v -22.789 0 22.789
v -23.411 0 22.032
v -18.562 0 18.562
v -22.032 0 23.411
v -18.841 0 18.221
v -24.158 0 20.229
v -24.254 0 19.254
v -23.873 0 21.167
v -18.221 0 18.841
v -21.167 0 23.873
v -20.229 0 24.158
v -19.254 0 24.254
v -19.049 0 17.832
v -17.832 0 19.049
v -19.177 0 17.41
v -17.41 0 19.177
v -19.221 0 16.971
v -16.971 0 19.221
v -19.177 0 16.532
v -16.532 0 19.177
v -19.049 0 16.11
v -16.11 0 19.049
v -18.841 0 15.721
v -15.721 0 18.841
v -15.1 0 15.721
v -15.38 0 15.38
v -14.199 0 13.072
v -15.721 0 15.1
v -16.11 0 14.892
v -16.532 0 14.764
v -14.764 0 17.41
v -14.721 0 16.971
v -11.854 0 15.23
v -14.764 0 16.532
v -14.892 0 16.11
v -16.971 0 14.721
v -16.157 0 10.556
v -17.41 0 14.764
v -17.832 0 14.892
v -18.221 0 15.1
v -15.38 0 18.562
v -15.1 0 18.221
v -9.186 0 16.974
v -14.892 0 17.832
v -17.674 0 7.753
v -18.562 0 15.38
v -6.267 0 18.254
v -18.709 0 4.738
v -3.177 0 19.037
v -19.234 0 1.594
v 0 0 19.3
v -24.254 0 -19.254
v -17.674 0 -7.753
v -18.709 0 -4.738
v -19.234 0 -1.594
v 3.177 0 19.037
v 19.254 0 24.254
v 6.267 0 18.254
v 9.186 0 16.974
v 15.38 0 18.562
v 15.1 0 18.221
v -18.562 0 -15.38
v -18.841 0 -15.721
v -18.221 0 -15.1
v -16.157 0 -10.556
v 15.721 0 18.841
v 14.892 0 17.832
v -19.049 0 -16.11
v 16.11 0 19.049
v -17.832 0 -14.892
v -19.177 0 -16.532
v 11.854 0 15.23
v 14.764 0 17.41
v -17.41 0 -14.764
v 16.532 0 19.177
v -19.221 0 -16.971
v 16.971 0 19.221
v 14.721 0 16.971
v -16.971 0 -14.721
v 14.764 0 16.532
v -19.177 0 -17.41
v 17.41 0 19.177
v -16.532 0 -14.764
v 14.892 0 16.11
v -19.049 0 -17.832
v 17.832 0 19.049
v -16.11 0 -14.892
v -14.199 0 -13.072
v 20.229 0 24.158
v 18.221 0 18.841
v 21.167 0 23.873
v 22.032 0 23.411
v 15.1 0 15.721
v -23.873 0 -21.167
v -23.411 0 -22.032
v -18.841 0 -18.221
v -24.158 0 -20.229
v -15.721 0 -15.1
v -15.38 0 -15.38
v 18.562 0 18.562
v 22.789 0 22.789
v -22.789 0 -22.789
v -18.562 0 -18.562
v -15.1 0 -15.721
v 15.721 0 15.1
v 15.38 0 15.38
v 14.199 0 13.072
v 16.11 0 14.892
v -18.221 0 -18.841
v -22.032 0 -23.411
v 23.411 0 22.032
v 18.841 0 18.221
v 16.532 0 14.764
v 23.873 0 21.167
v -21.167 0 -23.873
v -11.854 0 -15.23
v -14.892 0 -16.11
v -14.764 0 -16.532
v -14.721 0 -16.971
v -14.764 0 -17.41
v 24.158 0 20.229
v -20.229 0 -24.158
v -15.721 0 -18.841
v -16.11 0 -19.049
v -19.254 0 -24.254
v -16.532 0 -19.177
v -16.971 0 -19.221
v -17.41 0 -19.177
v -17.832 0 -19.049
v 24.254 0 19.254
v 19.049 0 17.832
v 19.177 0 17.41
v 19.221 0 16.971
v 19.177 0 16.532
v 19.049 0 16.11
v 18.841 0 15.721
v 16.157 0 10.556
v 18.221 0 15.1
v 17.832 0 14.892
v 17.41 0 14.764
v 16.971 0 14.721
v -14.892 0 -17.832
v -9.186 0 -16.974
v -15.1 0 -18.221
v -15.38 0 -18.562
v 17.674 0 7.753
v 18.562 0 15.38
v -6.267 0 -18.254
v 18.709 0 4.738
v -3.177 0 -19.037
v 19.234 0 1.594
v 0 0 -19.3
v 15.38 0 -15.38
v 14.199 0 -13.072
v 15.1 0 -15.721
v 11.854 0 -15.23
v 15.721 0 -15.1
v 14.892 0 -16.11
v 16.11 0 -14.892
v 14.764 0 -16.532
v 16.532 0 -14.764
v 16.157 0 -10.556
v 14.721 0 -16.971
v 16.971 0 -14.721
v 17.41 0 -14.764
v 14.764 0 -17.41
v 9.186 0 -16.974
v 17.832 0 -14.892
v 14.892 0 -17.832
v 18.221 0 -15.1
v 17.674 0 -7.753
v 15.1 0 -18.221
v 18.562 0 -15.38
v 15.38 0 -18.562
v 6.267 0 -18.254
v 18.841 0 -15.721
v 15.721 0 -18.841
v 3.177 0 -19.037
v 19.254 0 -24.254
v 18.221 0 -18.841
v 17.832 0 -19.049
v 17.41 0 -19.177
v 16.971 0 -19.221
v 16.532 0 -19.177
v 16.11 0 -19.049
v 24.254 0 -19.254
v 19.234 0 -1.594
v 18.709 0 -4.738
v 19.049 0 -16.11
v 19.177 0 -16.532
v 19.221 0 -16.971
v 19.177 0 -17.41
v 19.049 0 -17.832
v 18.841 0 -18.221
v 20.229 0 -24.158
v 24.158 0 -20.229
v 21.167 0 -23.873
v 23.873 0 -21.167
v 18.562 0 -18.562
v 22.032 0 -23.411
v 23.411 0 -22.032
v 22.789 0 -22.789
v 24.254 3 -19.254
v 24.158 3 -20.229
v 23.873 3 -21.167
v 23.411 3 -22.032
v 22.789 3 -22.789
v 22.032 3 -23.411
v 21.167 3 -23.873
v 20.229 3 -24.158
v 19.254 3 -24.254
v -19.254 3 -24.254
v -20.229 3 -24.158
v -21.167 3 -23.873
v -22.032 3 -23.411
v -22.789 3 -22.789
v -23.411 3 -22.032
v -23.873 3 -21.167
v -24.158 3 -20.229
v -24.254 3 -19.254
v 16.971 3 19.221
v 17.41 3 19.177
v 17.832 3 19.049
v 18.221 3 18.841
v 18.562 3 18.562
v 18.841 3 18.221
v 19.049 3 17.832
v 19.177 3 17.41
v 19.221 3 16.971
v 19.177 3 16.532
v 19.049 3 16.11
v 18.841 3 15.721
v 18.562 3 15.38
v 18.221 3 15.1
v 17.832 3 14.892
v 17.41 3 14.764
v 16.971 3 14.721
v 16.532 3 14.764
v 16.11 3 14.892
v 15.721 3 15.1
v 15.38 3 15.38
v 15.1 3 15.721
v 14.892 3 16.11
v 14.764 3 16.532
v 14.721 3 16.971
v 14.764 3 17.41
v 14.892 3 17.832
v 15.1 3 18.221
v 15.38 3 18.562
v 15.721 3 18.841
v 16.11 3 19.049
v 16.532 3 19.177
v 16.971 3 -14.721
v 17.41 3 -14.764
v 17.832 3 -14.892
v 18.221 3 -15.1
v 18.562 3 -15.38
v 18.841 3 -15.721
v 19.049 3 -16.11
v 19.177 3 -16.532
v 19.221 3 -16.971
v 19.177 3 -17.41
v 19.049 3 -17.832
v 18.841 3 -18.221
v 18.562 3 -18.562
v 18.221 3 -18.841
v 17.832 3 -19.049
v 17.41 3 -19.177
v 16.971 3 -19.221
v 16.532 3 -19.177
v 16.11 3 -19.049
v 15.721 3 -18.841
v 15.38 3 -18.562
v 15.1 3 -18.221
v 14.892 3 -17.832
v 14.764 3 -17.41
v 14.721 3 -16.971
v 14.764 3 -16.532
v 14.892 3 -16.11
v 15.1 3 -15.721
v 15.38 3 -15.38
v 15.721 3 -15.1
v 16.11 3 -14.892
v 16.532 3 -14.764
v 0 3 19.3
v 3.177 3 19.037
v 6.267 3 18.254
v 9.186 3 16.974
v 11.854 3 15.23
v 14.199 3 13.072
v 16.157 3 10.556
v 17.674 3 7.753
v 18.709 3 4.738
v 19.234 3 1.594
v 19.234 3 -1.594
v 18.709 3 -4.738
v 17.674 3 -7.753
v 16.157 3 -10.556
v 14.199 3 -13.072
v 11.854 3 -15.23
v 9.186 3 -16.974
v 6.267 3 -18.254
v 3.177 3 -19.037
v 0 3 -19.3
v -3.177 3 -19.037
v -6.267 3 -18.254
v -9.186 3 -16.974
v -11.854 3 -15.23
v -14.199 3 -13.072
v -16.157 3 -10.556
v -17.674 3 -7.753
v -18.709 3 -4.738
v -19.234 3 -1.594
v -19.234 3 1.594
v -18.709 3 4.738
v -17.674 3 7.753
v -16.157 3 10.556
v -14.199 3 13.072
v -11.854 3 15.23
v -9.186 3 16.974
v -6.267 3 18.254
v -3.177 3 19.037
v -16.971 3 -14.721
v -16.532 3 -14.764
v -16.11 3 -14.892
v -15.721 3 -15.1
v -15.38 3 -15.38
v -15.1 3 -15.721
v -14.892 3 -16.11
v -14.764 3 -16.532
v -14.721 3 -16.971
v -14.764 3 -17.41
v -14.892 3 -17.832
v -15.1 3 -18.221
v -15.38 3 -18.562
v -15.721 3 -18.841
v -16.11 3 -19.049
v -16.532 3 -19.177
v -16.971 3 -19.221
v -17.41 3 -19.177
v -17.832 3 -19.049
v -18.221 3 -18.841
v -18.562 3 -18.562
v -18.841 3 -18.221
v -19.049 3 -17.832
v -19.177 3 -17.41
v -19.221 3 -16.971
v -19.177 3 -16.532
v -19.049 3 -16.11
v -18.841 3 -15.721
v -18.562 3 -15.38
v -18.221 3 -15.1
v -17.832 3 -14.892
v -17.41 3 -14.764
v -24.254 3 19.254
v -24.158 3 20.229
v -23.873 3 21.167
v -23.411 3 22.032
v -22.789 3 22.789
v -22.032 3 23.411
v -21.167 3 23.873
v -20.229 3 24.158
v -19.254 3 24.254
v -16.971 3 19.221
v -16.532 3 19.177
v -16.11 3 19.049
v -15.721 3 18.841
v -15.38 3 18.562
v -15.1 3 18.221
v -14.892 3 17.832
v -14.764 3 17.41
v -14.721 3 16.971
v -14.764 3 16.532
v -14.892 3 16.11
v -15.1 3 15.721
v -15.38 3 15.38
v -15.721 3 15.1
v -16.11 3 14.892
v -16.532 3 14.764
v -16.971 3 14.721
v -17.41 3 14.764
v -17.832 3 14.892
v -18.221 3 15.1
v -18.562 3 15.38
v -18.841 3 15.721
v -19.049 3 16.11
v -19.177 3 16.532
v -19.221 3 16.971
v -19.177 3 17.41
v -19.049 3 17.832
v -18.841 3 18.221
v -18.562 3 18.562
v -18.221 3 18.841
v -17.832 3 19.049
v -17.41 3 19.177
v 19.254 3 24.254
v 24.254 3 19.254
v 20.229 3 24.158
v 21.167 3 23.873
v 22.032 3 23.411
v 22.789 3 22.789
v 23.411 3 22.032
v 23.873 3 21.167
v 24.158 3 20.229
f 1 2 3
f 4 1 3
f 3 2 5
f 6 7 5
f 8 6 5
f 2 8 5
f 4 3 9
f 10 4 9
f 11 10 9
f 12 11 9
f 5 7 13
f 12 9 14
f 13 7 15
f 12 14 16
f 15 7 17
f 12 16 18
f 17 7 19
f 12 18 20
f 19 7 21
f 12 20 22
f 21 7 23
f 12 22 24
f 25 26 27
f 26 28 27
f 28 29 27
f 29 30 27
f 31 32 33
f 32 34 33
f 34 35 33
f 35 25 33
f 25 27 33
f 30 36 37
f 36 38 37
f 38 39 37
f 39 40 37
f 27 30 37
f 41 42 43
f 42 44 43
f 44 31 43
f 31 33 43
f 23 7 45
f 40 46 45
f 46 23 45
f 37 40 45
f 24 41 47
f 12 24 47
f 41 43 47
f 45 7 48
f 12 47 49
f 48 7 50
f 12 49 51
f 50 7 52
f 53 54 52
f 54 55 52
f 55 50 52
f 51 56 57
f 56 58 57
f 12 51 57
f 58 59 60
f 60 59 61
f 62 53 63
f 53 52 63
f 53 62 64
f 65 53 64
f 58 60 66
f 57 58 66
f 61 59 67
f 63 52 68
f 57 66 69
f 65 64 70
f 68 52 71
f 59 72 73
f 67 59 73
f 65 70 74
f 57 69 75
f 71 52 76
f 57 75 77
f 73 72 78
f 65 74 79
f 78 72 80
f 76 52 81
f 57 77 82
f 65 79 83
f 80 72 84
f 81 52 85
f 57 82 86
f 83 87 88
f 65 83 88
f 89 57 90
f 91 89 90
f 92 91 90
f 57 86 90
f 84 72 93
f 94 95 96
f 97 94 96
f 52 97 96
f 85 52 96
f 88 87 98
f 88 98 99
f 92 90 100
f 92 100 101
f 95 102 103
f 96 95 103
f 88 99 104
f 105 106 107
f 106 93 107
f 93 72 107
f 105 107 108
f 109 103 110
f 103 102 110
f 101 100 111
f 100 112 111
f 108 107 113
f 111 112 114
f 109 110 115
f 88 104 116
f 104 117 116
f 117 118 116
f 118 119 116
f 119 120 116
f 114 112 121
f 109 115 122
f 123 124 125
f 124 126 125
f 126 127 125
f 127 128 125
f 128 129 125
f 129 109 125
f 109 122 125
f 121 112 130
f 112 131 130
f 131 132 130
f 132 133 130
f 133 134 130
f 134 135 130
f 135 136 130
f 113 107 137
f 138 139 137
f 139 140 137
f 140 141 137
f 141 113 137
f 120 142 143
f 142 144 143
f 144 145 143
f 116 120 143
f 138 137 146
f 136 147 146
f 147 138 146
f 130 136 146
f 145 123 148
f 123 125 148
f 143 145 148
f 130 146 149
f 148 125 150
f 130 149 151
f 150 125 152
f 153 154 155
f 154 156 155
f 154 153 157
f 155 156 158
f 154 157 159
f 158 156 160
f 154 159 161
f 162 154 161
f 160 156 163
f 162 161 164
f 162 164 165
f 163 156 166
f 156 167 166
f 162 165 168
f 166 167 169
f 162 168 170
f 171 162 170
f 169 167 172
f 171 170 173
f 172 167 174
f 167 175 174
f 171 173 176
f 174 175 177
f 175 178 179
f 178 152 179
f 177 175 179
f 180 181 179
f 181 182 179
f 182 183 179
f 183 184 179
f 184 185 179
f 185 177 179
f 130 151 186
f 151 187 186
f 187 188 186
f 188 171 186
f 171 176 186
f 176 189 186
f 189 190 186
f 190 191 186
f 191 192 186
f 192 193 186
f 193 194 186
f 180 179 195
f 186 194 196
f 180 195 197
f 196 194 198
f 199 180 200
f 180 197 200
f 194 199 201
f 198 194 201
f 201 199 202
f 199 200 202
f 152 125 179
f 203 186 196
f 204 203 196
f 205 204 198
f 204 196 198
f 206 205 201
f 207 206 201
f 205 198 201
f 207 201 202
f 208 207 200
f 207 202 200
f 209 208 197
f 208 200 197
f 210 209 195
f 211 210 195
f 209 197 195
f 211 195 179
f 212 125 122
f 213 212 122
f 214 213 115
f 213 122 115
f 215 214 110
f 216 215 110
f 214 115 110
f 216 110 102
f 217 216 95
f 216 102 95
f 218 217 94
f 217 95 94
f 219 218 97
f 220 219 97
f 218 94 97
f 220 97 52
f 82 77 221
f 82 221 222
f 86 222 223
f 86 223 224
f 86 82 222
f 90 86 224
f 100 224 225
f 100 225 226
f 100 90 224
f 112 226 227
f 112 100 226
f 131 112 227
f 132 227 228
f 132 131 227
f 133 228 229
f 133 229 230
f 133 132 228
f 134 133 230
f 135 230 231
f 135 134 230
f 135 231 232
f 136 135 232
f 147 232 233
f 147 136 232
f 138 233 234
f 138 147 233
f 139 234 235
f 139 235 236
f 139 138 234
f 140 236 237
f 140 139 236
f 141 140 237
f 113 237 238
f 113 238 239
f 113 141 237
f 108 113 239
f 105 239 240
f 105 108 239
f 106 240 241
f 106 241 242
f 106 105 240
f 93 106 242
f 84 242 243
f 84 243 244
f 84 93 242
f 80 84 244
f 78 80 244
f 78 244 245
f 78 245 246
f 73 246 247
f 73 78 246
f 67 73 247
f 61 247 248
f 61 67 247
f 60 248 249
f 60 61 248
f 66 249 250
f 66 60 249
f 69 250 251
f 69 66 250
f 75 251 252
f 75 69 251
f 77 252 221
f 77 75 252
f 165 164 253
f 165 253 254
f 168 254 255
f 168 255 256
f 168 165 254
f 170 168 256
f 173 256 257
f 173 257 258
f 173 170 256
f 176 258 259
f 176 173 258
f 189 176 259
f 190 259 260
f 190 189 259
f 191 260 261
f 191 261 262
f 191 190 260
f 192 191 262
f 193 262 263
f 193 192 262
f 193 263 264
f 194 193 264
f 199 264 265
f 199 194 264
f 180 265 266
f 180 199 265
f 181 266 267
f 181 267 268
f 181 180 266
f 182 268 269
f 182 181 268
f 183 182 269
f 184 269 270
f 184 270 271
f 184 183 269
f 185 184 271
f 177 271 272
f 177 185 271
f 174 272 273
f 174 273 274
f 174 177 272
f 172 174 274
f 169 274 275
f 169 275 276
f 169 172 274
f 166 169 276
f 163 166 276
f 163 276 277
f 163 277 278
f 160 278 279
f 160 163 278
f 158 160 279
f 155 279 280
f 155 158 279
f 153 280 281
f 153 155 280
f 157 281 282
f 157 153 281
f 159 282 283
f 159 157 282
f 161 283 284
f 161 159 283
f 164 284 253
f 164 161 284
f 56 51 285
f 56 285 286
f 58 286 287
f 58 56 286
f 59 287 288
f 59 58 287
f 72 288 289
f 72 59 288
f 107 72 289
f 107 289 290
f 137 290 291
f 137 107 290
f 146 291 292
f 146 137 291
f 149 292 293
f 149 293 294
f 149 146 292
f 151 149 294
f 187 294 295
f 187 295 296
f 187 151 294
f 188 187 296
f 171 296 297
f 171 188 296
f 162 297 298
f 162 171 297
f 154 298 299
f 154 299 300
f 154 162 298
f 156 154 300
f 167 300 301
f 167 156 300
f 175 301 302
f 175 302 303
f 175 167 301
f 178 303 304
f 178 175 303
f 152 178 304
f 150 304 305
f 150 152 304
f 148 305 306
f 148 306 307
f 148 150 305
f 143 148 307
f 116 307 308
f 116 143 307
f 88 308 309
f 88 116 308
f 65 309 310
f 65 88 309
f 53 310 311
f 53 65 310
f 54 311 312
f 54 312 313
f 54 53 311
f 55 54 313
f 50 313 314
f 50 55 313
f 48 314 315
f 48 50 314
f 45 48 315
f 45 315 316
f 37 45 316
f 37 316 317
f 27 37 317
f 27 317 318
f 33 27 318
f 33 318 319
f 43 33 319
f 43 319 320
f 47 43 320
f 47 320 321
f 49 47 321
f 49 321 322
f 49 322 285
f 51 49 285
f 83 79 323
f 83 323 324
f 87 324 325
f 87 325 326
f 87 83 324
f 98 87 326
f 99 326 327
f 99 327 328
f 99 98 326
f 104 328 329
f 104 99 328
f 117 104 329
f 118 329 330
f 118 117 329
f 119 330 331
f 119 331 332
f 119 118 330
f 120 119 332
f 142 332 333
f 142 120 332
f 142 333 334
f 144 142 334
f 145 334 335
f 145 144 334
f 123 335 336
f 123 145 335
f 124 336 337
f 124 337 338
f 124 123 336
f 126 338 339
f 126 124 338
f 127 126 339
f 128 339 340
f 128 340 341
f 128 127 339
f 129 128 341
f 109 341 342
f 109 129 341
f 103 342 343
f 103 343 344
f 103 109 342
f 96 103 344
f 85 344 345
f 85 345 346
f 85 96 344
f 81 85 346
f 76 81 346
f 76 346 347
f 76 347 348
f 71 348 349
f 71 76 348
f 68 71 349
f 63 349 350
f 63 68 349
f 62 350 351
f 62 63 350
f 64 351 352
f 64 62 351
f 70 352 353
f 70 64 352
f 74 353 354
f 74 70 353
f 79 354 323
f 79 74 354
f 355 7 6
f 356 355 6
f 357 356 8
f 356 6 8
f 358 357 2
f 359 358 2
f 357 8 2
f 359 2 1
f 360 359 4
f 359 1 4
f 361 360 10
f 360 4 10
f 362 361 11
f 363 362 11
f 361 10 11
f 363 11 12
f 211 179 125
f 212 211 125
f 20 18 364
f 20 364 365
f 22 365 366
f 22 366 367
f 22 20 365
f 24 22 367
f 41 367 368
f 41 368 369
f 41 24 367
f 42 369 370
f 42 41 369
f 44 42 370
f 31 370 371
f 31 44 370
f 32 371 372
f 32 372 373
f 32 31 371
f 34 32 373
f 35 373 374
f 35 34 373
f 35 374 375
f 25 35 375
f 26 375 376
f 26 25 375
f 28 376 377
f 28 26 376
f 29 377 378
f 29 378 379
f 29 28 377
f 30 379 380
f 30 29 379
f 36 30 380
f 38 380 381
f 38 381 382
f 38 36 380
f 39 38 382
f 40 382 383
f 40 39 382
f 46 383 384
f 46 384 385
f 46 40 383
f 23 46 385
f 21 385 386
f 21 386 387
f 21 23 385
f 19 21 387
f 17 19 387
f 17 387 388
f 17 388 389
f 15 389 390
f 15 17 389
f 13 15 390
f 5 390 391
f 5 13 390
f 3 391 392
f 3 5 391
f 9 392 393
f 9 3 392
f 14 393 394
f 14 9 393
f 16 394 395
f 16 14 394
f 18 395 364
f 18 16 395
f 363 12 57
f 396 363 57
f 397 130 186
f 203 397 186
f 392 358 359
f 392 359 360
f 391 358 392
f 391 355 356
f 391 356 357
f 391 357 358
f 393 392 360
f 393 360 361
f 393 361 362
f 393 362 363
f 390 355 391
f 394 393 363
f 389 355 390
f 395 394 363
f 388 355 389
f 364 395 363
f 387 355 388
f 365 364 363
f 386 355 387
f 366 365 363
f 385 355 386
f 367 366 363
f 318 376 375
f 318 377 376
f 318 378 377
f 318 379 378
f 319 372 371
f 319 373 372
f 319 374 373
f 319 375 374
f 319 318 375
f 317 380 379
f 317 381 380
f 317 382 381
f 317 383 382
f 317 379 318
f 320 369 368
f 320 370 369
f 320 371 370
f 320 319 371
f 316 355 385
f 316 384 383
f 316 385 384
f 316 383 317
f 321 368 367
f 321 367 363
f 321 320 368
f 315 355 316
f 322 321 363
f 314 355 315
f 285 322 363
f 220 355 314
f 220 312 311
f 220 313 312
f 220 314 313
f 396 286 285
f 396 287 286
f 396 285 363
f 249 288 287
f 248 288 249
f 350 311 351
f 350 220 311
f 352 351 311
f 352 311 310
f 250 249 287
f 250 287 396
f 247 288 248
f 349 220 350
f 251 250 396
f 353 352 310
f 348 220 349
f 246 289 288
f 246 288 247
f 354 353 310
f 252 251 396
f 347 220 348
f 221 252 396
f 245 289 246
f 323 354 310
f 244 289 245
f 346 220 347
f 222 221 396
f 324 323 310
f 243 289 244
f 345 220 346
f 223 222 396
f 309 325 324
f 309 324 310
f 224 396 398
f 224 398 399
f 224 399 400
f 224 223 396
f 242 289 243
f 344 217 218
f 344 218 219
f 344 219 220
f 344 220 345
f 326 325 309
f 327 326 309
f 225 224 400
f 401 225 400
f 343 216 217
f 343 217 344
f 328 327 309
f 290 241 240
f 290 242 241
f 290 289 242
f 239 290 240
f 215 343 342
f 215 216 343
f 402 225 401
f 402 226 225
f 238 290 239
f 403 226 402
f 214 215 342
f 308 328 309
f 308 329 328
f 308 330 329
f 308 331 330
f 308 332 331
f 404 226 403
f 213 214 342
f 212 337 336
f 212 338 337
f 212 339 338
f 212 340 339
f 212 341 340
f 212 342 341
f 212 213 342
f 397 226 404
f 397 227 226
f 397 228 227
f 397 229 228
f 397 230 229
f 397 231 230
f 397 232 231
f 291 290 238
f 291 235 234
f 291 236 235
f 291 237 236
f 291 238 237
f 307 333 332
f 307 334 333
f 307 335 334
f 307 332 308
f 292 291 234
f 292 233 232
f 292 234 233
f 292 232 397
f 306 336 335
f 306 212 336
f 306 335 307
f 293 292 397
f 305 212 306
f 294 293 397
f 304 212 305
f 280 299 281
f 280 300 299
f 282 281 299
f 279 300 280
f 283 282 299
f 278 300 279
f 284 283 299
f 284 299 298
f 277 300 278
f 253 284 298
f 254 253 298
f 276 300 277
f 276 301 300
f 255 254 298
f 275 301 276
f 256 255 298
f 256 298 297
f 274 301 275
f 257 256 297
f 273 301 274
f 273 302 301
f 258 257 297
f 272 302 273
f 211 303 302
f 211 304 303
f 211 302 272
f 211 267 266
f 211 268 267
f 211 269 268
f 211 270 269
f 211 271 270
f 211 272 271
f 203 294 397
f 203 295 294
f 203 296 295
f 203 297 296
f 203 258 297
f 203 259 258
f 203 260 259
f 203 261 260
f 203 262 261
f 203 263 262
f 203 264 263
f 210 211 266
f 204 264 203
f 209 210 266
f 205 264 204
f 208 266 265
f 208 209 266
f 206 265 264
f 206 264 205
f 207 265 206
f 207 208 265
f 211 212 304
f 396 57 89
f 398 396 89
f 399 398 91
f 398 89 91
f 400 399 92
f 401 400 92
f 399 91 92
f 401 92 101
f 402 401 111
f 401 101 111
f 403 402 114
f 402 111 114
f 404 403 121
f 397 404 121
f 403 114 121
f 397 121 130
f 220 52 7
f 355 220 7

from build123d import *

# Parameters (mm, degrees)
SKETCH_1_R      = 19.3
SKETCH_1_R_2    = 2.25
EXTRUDE_1_DEPTH = 3


with BuildPart() as part:
    # 草图1 → 凸台-拉伸1 (new body)
    with BuildSketch(Plane(origin=(0, 0, 0), x_dir=(1, 0, 0), z_dir=(0, 1, 0))):
        with BuildLine():
            Line((-19.253762595, -24.253762595), (19.253762595, -24.253762595))
            ThreePointArc((19.253762595, -24.253762595), (22.789296501, -22.789296501), (24.253762595, -19.253762595))
            Line((24.253762595, -19.253762595), (24.253762595, 19.253762595))
            ThreePointArc((24.253762595, 19.253762595), (22.789296501, 22.789296501), (19.253762595, 24.253762595))
            Line((19.253762595, 24.253762595), (-19.253762595, 24.253762595))
            ThreePointArc((-19.253762595, 24.253762595), (-22.789296501, 22.789296501), (-24.253762595, 19.253762595))
            Line((-24.253762595, 19.253762595), (-24.253762595, -19.253762595))
            ThreePointArc((-24.253762595, -19.253762595), (-22.789296501, -22.789296501), (-19.253762595, -24.253762595))
        make_face()
        with Locations(Location((0, 0, 0), (0, 0, 270))):
            Circle(SKETCH_1_R, mode=Mode.SUBTRACT)
        with Locations(Location((-16.970562748, 16.970562748, 0), (0, 0, 270))):
            Circle(SKETCH_1_R_2, mode=Mode.SUBTRACT)
        with Locations(Location((16.970562748, 16.970562748, 0), (0, 0, 270))):
            Circle(SKETCH_1_R_2, mode=Mode.SUBTRACT)
        with Locations(Location((16.970562748, -16.970562748, 0), (0, 0, 270))):
            Circle(SKETCH_1_R_2, mode=Mode.SUBTRACT)
        with Locations(Location((-16.970562748, -16.970562748, 0), (0, 0, 270))):
            Circle(SKETCH_1_R_2, mode=Mode.SUBTRACT)
    extrude(amount=EXTRUDE_1_DEPTH)


solid = part.part
